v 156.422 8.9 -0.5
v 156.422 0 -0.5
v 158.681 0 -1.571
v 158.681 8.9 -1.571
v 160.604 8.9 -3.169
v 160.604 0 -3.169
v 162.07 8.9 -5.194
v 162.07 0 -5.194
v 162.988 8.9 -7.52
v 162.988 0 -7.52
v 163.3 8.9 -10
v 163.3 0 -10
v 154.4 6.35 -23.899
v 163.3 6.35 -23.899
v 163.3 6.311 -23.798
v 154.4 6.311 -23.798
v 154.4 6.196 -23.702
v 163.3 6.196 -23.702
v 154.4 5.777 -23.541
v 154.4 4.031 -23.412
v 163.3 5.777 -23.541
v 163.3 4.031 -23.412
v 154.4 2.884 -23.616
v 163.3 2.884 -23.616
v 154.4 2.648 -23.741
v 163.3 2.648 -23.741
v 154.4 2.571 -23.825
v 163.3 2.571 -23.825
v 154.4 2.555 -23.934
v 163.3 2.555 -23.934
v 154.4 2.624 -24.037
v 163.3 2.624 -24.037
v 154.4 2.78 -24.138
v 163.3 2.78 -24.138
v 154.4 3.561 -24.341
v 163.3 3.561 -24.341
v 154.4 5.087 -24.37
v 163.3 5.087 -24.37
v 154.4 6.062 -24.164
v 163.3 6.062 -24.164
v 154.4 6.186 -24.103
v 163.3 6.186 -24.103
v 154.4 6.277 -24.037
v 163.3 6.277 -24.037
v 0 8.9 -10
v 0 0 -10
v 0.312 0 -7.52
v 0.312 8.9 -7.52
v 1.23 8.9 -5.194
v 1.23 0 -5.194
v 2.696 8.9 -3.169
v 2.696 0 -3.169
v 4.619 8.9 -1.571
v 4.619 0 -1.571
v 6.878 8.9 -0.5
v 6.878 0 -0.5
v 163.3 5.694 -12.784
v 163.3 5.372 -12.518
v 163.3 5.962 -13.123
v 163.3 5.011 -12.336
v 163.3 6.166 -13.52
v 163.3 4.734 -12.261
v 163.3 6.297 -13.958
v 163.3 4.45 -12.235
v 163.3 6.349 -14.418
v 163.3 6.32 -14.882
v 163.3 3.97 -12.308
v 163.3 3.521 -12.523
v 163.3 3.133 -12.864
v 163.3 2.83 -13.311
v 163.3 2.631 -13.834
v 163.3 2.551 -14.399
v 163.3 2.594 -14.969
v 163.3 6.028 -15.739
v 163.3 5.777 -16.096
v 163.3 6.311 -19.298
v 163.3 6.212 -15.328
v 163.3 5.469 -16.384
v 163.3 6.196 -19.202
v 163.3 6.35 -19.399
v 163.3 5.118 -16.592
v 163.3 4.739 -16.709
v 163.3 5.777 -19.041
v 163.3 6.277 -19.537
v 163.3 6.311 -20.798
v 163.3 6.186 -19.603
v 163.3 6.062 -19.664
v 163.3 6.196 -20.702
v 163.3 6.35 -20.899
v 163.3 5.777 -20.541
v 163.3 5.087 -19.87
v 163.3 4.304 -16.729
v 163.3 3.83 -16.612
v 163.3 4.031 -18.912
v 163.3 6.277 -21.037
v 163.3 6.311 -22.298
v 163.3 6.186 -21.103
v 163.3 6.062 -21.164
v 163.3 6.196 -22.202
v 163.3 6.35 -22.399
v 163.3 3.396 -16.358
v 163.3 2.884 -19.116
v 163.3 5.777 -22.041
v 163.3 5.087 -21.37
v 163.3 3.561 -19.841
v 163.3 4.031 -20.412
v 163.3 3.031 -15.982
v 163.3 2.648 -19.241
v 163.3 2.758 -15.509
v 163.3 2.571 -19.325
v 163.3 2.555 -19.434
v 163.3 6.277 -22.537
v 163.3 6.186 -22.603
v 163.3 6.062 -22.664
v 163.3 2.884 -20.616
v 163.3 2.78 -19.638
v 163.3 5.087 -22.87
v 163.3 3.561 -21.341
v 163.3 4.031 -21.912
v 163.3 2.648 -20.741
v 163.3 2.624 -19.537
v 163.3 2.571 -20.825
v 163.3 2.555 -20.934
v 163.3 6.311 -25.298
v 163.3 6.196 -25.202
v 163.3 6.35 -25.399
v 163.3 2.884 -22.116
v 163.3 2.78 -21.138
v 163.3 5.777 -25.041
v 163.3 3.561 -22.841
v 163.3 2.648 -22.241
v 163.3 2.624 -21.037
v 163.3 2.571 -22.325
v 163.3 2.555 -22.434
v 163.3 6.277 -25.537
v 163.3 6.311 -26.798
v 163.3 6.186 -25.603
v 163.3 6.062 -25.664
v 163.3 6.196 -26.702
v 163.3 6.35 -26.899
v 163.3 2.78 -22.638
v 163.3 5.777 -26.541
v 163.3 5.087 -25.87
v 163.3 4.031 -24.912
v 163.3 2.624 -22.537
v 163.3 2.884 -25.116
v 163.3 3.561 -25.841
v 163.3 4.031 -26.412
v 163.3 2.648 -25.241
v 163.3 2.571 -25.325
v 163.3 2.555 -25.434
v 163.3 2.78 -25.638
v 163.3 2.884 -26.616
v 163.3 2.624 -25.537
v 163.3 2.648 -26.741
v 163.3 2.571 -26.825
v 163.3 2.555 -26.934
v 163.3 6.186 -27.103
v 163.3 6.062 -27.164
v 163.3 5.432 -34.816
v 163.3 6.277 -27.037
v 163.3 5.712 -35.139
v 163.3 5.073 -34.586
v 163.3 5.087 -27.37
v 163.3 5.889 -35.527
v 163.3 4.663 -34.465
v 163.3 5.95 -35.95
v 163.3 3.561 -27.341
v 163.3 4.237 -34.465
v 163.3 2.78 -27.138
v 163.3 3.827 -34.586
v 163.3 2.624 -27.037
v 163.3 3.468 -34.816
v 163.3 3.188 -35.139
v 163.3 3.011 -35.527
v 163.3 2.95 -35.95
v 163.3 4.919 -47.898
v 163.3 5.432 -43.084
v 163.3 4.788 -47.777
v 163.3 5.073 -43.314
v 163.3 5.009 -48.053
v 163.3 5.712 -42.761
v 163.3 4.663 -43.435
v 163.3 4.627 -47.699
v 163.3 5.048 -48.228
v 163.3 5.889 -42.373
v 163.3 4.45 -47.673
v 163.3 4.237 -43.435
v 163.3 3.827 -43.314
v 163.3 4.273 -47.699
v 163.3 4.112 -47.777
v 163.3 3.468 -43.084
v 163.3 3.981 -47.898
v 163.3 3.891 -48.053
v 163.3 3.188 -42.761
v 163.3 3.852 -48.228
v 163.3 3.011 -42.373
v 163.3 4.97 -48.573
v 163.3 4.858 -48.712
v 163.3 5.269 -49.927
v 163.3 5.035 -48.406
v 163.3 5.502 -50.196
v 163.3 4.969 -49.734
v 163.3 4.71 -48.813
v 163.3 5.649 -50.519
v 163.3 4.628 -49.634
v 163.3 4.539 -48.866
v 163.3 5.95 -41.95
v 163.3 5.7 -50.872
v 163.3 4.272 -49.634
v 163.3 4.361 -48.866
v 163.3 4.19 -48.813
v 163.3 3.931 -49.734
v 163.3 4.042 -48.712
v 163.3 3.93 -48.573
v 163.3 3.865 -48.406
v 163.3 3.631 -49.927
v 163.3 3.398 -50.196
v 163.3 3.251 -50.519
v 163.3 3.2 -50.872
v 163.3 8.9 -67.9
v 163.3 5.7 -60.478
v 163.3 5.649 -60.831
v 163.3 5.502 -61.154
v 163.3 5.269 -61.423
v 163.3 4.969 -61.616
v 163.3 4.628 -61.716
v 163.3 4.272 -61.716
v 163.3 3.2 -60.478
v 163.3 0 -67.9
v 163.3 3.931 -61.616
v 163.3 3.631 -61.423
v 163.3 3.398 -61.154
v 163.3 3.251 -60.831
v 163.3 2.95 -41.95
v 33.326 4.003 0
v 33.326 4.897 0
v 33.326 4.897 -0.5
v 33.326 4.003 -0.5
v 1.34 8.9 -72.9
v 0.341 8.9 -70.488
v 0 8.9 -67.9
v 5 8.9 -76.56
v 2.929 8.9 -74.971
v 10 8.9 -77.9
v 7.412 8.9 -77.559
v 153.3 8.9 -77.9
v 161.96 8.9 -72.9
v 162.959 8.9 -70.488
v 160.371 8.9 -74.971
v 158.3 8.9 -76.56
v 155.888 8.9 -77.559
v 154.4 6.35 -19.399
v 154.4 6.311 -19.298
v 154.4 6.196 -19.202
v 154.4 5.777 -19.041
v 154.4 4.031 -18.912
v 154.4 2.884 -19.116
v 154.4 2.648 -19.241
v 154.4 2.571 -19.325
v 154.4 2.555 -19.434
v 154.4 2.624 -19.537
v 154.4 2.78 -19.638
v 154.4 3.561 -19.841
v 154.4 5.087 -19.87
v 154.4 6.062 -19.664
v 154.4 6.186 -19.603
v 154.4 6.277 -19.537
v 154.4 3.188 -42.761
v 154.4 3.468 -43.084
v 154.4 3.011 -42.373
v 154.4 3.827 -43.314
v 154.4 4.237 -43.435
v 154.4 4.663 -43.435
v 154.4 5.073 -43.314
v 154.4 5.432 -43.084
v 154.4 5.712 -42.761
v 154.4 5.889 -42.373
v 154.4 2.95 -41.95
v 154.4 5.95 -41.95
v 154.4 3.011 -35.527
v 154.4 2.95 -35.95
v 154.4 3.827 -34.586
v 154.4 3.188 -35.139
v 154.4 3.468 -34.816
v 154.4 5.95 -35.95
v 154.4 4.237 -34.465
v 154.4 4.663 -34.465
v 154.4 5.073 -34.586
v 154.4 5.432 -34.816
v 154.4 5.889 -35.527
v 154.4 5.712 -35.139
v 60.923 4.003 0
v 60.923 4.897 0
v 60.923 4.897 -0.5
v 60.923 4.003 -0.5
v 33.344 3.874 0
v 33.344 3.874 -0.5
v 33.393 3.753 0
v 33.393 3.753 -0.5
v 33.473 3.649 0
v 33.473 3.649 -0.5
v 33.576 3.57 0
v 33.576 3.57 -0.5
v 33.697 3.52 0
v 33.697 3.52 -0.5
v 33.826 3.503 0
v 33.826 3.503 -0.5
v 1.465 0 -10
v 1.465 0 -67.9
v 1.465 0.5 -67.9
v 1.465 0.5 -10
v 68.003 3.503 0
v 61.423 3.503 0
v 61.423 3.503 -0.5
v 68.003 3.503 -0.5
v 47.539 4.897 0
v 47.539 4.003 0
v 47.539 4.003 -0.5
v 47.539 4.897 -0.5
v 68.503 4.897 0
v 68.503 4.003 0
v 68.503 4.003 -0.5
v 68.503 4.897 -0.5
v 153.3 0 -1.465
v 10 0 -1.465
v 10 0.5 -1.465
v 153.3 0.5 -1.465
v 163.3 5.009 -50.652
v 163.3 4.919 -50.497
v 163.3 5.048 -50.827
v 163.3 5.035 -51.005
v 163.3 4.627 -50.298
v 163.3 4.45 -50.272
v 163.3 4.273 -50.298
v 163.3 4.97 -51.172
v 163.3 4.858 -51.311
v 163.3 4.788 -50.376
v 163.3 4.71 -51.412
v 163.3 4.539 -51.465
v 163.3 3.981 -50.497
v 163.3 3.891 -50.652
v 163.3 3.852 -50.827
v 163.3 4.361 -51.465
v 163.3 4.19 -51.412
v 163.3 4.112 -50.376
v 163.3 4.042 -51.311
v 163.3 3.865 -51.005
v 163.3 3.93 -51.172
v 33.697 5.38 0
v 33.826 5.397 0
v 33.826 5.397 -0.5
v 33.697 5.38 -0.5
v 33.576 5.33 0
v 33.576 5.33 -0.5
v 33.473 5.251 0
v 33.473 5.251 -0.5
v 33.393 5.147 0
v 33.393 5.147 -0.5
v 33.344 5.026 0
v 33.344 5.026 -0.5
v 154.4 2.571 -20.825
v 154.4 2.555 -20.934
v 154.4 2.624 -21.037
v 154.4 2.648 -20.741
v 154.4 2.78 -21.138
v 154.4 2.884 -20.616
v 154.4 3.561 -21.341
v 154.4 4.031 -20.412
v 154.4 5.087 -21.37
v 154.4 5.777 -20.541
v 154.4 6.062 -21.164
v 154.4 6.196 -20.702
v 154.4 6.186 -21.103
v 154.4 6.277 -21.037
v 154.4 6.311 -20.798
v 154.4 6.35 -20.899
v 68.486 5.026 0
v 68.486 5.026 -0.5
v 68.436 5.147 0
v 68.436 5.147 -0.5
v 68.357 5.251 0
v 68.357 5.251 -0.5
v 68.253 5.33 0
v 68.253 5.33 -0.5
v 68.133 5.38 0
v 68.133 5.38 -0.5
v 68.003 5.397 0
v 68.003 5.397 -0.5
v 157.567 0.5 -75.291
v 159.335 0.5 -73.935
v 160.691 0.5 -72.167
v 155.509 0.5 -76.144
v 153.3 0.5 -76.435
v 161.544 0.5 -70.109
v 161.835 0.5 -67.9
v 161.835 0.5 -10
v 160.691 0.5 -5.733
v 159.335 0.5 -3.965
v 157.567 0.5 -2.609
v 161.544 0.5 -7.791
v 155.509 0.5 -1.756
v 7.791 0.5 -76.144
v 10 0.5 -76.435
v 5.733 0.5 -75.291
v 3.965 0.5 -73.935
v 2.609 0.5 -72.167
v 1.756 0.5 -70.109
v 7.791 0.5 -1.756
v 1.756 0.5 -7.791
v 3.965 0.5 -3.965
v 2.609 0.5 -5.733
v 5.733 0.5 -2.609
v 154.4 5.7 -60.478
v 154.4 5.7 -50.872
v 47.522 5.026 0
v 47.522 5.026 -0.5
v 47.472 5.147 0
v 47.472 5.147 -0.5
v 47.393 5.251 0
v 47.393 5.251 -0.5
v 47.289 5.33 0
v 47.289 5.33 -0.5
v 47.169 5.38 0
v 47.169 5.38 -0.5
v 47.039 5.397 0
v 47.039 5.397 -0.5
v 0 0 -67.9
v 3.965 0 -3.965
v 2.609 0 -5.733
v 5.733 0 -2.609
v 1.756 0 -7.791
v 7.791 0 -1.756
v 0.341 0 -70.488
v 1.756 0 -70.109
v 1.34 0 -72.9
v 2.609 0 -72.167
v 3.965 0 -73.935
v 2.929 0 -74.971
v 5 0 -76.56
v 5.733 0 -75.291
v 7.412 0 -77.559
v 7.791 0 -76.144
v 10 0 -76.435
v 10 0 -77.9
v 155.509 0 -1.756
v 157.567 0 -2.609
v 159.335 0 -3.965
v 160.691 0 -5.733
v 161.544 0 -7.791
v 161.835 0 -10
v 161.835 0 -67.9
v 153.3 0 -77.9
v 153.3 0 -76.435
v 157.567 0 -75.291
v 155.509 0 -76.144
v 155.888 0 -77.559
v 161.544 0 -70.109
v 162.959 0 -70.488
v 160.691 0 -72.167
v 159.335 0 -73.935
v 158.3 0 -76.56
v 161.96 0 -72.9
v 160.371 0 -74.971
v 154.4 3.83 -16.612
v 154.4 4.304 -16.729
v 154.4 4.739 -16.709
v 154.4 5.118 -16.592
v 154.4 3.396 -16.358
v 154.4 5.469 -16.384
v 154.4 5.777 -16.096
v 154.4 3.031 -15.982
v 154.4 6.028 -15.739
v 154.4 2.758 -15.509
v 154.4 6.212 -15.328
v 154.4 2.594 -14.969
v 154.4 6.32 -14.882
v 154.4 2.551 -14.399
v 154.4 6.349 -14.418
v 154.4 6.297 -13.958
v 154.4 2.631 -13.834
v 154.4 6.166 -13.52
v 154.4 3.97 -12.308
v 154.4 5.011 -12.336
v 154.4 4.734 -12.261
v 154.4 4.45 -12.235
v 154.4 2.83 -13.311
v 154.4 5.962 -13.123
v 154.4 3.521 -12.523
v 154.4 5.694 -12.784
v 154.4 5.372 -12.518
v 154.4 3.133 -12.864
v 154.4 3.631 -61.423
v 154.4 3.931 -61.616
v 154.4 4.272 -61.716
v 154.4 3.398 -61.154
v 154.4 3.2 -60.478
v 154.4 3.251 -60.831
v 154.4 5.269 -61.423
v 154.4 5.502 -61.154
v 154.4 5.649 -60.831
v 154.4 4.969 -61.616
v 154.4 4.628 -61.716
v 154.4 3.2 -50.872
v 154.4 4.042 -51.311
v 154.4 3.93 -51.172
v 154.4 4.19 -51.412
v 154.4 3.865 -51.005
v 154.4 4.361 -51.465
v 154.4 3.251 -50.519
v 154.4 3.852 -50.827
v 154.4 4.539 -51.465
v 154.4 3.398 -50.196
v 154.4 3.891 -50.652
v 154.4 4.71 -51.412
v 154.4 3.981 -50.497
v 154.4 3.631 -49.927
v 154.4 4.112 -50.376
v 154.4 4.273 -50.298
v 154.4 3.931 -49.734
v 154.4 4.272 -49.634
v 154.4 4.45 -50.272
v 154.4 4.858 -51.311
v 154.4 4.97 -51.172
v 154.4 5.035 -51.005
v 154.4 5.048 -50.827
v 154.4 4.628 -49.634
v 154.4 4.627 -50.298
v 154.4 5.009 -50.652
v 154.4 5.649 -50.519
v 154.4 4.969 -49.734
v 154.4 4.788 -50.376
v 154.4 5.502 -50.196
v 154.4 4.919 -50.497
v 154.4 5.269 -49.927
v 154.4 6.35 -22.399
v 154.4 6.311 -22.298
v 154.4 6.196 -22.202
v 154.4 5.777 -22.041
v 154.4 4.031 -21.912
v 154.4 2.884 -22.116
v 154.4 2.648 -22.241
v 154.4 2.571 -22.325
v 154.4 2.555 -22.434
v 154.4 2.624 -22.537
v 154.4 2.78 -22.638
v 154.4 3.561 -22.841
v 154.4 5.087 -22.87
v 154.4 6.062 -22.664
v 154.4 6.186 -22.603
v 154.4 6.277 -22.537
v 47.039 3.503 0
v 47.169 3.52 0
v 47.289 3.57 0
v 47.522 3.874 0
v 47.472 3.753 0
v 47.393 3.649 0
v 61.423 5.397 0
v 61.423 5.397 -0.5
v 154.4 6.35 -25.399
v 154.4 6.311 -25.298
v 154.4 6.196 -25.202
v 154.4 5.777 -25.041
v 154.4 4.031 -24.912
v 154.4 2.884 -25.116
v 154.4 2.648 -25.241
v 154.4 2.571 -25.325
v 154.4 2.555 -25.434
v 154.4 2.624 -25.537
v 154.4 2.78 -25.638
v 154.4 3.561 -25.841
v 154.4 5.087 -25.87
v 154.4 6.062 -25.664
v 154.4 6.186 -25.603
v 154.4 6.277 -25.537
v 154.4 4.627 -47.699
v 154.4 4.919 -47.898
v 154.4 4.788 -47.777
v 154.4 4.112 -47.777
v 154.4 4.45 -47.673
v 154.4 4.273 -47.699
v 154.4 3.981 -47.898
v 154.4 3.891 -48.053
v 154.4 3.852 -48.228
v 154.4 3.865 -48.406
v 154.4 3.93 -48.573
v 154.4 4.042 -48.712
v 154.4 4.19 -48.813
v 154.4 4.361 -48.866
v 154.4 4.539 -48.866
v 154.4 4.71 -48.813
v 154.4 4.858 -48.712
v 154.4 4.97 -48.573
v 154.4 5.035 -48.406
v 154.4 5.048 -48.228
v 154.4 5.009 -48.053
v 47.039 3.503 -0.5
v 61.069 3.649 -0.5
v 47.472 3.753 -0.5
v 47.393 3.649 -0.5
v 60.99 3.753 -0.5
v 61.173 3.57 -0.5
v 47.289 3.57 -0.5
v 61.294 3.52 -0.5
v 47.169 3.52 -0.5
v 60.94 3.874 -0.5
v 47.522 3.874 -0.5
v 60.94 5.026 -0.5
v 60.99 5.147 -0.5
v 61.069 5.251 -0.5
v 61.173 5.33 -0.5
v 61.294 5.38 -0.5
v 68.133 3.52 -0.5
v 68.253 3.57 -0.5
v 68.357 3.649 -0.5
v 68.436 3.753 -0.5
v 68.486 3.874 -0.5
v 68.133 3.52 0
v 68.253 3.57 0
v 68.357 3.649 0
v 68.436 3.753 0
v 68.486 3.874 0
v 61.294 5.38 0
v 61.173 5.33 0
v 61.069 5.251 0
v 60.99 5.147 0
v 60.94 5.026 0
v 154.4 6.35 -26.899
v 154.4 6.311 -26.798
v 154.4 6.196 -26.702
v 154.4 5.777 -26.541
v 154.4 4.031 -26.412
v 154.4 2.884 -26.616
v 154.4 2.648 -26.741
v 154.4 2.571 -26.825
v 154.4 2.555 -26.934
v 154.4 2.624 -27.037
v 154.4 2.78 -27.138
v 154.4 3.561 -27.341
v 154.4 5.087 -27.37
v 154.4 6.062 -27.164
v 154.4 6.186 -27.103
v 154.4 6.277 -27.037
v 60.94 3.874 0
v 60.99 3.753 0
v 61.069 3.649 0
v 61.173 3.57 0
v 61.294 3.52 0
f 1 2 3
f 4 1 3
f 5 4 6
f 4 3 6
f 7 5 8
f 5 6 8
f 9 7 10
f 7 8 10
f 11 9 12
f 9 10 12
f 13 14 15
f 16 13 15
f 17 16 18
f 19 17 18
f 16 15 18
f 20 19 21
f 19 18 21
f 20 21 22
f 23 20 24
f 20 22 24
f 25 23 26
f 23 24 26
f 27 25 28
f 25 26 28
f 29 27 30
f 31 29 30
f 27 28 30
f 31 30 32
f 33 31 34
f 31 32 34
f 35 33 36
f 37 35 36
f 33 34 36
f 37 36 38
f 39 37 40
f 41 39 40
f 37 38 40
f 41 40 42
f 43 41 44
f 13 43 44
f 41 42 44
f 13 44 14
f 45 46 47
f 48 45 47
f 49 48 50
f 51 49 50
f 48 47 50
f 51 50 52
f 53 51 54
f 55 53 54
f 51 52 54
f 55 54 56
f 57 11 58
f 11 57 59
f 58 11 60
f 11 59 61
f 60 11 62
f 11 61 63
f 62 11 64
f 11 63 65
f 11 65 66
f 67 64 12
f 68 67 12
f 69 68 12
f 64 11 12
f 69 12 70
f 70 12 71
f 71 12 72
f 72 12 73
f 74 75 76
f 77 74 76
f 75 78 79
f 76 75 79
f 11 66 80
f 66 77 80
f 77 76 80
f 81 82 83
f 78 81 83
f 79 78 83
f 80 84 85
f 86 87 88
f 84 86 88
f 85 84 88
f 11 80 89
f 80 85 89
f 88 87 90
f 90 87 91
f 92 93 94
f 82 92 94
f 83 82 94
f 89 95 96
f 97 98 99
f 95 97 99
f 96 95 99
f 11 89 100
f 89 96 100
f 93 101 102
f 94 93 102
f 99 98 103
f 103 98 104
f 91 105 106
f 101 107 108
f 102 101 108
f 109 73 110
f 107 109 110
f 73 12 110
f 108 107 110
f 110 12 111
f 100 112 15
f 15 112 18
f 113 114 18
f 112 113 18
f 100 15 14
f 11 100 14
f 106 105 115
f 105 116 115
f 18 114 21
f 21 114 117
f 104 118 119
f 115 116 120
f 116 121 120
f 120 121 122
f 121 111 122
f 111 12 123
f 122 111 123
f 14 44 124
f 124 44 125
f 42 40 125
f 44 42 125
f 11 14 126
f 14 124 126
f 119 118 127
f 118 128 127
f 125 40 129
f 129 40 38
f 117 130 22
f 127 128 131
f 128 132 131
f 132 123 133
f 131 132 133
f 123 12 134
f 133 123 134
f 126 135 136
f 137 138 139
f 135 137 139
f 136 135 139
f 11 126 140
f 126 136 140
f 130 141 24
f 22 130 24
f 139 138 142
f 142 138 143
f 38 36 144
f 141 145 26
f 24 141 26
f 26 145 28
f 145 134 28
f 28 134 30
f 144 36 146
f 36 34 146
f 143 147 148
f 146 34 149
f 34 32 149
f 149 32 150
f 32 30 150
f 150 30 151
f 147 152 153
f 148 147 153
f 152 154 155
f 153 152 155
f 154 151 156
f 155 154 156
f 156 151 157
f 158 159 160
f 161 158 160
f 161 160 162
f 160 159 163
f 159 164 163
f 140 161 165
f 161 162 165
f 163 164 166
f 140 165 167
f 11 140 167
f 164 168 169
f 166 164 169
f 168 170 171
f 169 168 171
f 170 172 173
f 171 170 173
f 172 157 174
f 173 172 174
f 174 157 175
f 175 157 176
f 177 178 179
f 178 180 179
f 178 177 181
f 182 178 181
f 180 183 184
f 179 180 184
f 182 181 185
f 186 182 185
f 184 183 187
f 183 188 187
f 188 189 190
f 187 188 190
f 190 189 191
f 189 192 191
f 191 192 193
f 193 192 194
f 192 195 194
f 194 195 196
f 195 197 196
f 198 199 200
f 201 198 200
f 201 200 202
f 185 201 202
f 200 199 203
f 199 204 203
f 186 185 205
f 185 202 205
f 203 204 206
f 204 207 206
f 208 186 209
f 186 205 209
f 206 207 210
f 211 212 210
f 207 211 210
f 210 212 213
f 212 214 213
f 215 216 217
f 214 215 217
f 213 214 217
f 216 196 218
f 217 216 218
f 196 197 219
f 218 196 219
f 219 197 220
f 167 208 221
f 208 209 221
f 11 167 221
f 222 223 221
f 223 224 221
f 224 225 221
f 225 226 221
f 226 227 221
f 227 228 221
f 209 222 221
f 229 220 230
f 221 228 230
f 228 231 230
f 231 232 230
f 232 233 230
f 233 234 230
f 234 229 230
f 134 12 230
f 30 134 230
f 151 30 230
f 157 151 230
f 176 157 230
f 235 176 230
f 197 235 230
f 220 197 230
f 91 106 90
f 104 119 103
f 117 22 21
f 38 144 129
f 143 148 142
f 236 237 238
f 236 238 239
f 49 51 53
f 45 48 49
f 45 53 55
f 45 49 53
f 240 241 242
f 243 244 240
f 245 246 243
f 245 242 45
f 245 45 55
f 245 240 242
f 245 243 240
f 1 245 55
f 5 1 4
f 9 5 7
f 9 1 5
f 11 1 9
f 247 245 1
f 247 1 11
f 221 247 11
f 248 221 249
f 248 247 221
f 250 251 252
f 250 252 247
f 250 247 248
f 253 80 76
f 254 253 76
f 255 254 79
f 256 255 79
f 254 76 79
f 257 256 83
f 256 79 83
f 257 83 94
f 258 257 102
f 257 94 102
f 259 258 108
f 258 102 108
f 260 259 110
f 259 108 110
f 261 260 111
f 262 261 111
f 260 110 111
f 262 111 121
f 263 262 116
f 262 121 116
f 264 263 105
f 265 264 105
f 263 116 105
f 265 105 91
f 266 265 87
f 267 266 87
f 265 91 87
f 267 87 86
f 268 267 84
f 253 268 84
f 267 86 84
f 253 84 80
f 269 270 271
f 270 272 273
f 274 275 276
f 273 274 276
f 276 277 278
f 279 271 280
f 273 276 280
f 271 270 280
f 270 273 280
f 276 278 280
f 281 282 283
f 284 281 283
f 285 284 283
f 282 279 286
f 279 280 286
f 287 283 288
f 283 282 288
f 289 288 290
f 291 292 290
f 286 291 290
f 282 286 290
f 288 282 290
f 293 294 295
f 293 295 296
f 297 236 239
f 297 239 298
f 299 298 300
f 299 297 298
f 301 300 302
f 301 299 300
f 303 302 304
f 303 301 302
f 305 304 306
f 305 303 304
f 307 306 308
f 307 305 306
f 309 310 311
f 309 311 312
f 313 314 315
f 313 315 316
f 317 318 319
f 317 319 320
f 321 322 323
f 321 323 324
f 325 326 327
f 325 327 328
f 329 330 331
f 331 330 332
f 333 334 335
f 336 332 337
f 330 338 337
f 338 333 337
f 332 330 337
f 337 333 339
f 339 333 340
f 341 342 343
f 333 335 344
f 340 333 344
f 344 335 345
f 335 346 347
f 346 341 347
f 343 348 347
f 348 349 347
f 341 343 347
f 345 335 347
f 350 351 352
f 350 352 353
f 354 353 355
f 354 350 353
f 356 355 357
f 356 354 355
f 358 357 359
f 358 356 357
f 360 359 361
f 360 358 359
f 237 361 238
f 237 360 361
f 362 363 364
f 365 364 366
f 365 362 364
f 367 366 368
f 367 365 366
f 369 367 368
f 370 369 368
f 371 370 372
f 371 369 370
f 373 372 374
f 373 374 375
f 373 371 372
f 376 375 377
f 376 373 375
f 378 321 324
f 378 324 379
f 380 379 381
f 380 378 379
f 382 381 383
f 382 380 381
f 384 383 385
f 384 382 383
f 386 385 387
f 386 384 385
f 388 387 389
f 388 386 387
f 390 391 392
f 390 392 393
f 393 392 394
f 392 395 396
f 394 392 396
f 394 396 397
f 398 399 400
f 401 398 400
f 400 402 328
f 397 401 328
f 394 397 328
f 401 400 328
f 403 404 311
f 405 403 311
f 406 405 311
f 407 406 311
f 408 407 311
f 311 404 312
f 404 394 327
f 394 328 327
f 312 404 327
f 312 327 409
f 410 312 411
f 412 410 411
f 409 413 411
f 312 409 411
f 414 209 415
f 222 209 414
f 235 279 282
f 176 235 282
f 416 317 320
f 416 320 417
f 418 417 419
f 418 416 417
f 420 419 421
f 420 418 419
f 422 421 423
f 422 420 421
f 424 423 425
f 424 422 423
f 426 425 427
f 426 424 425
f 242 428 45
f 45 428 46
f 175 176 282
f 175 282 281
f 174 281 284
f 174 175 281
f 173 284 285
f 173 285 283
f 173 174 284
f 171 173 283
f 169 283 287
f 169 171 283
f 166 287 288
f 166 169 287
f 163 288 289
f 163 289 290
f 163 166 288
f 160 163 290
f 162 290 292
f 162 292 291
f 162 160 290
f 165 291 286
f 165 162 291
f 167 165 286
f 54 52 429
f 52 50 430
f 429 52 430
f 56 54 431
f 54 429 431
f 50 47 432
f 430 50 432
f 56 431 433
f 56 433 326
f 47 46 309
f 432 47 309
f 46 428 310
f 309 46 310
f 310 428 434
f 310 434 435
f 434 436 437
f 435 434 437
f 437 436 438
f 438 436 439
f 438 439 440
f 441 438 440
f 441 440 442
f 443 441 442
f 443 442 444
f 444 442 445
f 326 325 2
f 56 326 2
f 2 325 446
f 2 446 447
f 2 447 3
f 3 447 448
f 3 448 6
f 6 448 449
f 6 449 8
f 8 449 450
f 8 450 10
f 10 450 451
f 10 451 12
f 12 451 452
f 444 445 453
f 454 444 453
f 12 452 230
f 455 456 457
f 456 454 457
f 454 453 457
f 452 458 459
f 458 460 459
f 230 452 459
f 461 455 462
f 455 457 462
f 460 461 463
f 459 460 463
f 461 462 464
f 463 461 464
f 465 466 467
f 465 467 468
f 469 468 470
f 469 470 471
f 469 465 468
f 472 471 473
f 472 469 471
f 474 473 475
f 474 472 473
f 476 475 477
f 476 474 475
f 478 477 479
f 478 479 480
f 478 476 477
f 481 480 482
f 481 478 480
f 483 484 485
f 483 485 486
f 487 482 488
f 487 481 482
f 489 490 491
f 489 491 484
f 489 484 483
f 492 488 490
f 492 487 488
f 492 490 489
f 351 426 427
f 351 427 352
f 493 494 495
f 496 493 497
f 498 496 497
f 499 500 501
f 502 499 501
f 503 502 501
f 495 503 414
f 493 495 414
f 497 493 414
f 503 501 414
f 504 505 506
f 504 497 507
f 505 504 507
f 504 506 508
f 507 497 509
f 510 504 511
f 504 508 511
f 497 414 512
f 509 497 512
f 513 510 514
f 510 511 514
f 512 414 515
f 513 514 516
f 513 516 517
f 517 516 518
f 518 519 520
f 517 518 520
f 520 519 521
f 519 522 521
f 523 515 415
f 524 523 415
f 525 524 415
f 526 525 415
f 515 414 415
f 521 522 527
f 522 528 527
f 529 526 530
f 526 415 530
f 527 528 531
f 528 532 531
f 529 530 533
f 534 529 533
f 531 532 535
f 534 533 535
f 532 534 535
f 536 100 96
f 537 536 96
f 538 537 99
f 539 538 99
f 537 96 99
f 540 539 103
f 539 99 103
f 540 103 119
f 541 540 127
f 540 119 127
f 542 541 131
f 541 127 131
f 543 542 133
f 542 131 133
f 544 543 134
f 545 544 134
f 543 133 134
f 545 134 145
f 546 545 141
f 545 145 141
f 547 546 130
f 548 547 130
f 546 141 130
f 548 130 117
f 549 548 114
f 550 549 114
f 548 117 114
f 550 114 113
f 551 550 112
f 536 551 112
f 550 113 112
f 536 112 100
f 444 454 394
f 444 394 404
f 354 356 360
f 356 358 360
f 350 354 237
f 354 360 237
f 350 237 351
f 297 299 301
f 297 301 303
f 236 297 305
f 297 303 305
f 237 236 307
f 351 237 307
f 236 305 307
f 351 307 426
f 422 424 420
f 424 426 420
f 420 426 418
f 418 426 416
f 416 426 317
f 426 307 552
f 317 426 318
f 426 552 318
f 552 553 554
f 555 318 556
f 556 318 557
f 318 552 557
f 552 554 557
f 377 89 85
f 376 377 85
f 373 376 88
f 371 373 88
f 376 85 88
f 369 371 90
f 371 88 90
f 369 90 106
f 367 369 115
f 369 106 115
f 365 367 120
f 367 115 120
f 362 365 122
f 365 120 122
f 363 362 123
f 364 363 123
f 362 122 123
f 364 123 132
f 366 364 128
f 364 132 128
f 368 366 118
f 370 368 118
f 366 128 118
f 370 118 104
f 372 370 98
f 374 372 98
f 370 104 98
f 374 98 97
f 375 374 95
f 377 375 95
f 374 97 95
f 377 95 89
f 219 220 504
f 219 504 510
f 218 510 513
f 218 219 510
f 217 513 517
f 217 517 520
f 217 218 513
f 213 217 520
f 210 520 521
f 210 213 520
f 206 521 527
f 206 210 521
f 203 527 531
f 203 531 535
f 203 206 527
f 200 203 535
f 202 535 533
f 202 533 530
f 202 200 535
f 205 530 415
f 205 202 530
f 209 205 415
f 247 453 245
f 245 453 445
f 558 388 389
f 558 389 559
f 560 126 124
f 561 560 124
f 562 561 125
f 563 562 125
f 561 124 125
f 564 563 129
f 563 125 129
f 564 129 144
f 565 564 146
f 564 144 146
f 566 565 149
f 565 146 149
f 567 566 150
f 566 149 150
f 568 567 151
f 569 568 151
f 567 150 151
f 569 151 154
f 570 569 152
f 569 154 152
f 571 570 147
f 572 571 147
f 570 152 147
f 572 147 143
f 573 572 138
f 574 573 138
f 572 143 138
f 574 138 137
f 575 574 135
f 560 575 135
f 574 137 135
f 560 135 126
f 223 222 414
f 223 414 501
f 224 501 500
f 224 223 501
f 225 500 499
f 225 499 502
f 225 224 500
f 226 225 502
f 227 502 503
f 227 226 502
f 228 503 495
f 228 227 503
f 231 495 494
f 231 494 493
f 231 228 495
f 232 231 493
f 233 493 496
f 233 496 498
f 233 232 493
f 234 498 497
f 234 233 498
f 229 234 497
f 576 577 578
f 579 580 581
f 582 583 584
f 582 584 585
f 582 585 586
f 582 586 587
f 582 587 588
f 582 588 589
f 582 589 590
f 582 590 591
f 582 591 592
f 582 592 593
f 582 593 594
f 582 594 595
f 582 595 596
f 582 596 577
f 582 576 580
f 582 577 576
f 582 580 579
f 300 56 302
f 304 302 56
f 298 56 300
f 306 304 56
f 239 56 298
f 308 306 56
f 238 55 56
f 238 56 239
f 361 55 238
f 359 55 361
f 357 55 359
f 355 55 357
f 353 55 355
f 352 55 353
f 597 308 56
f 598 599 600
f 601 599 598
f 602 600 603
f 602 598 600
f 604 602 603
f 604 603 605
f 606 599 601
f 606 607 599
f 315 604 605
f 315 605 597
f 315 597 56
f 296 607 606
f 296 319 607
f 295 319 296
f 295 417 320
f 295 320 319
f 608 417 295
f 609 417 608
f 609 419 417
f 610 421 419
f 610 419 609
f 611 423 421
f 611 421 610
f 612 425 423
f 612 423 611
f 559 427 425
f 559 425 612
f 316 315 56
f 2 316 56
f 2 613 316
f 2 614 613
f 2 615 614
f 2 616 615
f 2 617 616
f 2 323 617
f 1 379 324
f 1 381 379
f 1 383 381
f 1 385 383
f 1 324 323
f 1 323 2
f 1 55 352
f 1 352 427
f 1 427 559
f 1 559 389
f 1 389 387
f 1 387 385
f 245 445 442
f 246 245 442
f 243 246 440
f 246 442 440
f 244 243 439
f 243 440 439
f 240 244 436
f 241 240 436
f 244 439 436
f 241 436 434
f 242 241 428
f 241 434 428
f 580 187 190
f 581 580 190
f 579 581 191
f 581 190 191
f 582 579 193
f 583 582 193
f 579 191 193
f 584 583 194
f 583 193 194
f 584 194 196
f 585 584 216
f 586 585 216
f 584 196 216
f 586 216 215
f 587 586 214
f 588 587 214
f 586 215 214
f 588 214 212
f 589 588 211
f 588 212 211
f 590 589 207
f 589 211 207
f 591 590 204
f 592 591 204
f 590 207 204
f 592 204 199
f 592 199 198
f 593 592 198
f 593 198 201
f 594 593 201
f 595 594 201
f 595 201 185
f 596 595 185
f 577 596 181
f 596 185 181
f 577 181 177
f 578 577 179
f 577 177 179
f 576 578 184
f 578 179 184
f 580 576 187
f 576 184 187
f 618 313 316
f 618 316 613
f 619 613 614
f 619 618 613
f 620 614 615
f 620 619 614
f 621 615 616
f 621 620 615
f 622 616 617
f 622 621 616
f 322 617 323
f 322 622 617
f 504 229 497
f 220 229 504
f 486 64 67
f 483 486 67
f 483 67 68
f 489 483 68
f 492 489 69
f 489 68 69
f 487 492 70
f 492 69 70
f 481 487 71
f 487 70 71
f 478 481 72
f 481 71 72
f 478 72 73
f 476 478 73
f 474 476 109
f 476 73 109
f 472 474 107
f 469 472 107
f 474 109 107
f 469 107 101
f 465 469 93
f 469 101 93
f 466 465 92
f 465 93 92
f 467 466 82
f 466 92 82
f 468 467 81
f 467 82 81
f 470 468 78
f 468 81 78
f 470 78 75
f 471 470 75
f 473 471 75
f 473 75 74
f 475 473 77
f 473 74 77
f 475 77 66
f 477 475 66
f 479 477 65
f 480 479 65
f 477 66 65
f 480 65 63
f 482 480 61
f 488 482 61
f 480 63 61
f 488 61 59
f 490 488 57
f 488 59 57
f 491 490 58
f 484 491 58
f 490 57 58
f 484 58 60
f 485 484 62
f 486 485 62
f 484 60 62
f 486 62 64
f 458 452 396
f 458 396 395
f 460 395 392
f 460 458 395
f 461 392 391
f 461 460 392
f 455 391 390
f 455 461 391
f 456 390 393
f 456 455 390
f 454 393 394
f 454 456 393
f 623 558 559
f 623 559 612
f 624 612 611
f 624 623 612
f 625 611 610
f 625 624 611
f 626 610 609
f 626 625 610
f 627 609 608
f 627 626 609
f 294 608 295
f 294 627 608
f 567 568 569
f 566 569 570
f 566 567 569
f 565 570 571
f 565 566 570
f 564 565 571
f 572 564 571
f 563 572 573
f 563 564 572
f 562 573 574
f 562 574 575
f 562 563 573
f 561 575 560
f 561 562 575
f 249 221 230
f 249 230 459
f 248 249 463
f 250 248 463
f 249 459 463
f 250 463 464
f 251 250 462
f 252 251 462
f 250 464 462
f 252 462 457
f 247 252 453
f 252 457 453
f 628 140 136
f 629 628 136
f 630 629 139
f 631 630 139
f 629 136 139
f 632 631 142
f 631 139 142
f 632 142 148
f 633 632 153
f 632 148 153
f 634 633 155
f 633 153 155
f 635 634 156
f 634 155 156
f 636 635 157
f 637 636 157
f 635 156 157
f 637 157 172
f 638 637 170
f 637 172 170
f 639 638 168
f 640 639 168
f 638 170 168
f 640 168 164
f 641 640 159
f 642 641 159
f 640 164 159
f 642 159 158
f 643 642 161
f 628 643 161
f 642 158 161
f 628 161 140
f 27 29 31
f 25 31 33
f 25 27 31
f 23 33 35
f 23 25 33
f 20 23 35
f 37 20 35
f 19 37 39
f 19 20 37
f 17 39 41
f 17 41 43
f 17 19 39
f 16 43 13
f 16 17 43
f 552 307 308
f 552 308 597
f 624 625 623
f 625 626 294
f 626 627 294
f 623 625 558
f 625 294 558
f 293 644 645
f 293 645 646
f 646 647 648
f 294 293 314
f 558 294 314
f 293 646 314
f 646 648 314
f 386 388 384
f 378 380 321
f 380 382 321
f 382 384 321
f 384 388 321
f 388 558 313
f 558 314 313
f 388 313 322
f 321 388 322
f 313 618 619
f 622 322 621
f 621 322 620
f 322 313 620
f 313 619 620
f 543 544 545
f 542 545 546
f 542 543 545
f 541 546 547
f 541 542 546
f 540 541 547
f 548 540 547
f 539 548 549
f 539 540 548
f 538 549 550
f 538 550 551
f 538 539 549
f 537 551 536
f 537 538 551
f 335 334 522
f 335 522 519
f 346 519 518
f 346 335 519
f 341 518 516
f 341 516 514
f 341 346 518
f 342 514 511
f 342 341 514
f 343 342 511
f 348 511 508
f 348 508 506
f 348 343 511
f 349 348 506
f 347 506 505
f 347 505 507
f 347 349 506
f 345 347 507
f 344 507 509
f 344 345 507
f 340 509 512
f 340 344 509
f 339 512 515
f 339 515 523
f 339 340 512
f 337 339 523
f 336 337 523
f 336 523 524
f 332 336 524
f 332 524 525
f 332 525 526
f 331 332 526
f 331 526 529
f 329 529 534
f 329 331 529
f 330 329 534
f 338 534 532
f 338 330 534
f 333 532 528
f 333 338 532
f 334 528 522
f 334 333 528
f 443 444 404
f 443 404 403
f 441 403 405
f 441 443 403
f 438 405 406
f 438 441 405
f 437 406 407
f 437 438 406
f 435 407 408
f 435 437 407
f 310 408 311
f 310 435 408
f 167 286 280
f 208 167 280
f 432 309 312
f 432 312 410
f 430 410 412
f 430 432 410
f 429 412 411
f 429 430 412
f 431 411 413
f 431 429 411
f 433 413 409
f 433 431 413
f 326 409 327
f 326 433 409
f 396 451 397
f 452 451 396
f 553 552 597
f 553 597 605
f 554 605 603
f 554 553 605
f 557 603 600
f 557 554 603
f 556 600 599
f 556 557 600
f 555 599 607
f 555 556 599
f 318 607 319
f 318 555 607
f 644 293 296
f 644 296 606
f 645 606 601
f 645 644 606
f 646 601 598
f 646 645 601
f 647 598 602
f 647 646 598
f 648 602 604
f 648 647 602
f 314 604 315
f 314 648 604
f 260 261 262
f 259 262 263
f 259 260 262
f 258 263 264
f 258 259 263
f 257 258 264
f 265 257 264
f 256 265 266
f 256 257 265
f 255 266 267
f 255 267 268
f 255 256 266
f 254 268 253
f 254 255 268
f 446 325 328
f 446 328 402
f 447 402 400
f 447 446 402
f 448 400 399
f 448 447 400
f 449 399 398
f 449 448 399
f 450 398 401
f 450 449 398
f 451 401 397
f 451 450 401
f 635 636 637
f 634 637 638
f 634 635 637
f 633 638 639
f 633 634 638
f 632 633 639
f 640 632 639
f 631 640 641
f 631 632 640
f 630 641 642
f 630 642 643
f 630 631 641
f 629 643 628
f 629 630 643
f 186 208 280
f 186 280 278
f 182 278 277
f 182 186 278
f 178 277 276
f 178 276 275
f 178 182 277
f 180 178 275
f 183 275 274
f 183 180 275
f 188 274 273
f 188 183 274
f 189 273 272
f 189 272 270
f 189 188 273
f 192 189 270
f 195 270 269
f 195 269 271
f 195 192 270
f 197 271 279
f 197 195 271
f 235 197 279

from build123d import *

# Parameters (mm, degrees)
EXTRUDE_1_DEPTH     = 8.9
CUT_EXTRUDE_START   = 163.3
SKETCH_2_R          = 0.6
SKETCH_2_RX         = 2.25
SKETCH_2_RY         = 1.9
SKETCH_2_RX_2       = 1.9
SKETCH_2_RY_2       = 0.5
CUT_EXTRUDE_5_DEPTH = 8.9
SKETCH_7_OUTSIDE_W  = 201.53
SKETCH_7_OUTSIDE_H  = 47.13
CUT_EXTRUDE_6_DEPTH = 0.5
CUT_EXTRUDE_7_DEPTH = 0.5


with BuildPart() as part:
    # 草图1 → 凸台-拉伸1 (new body)
    with BuildSketch(Plane(origin=(0, 0, 0), x_dir=(1, 0, 0), z_dir=(0, 1, 0))):
        with BuildLine():
            Line((10, 0), (153.3, 0))
            ThreePointArc((153.3, 0), (160.371067812, 2.928932188), (163.3, 10))
            Line((163.3, 10), (163.3, 67.9))
            ThreePointArc((163.3, 67.9), (160.371067812, 74.971067812), (153.3, 77.9))
            Line((153.3, 77.9), (10, 77.9))
            ThreePointArc((10, 77.9), (2.928932188, 74.971067812), (0, 67.9))
            Line((0, 67.9), (0, 10))
            ThreePointArc((0, 10), (2.928932188, 2.928932188), (10, 0))
        make_face()
    extrude(amount=EXTRUDE_1_DEPTH)

    # 草图2 → 切除-拉伸5 (cut)
    # profile 1 of 10: a face of its own
    with BuildSketch(Plane(origin=(0, 0, 0), x_dir=(0, 0, -1), z_dir=(1, 0, 0)).offset(CUT_EXTRUDE_START)):
        with Locations(Location((48.272527564, 4.45, 0), (0, 0, 180))):
            Circle(SKETCH_2_R)
    # profile 2 of 10: a face of its own
    with BuildSketch(Plane(origin=(0, 0, 0), x_dir=(0, 0, -1), z_dir=(1, 0, 0)).offset(CUT_EXTRUDE_START)):
        with Locations(Location((14.485427664, 4.45), (0, 0, 180))):
            Ellipse(SKETCH_2_RX, SKETCH_2_RY)
    # profile 3 of 10: a face of its own
    with BuildSketch(Plane(origin=(0, 0, 0), x_dir=(0, 0, -1), z_dir=(1, 0, 0)).offset(CUT_EXTRUDE_START)):
        with Locations(Location((19.399284115, 4.45), (0, 0, 90))):
            Ellipse(SKETCH_2_RX_2, SKETCH_2_RY_2)
    # profile 4 of 10: a face of its own
    with BuildSketch(Plane(origin=(0, 0, 0), x_dir=(0, 0, -1), z_dir=(1, 0, 0)).offset(CUT_EXTRUDE_START)):
        with Locations(Location((20.899284115, 4.45), (0, 0, 90))):
            Ellipse(SKETCH_2_RX_2, SKETCH_2_RY_2)
    # profile 5 of 10: a face of its own
    with BuildSketch(Plane(origin=(0, 0, 0), x_dir=(0, 0, -1), z_dir=(1, 0, 0)).offset(CUT_EXTRUDE_START)):
        with Locations(Location((22.399284115, 4.45), (0, 0, 90))):
            Ellipse(SKETCH_2_RX_2, SKETCH_2_RY_2)
    # profile 6 of 10: a face of its own
    with BuildSketch(Plane(origin=(0, 0, 0), x_dir=(0, 0, -1), z_dir=(1, 0, 0)).offset(CUT_EXTRUDE_START)):
        with Locations(Location((23.899284115, 4.45), (0, 0, 90))):
            Ellipse(SKETCH_2_RX_2, SKETCH_2_RY_2)
    # profile 7 of 10: a face of its own
    with BuildSketch(Plane(origin=(0, 0, 0), x_dir=(0, 0, -1), z_dir=(1, 0, 0)).offset(CUT_EXTRUDE_START)):
        with Locations(Location((25.399284115, 4.45), (0, 0, 90))):
            Ellipse(SKETCH_2_RX_2, SKETCH_2_RY_2)
    # profile 8 of 10: a face of its own
    with BuildSketch(Plane(origin=(0, 0, 0), x_dir=(0, 0, -1), z_dir=(1, 0, 0)).offset(CUT_EXTRUDE_START)):
        with Locations(Location((26.899284115, 4.45), (0, 0, 90))):
            Ellipse(SKETCH_2_RX_2, SKETCH_2_RY_2)
    # profile 9 of 10: a face of its own
    with BuildSketch(Plane(origin=(0, 0, 0), x_dir=(0, 0, -1), z_dir=(1, 0, 0)).offset(CUT_EXTRUDE_START)):
        with BuildLine():
            Line((41.95, 2.95), (35.95, 2.95))
            ThreePointArc((35.95, 2.95), (34.45, 4.45), (35.95, 5.95))
            Line((35.95, 5.95), (41.95, 5.95))
            ThreePointArc((41.95, 5.95), (43.45, 4.45), (41.95, 2.95))
        make_face()
    # profile 10 of 10: a face of its own
    with BuildSketch(Plane(origin=(0, 0, 0), x_dir=(0, 0, -1), z_dir=(1, 0, 0)).offset(CUT_EXTRUDE_START)):
        with BuildLine():
            Line((60.478464751, 3.2), (50.871535249, 3.2))
            ThreePointArc((50.871535249, 3.2), (49.621535249, 4.45), (50.871535249, 5.7))
            Line((50.871535249, 5.7), (60.478464751, 5.7))
            ThreePointArc((60.478464751, 5.7), (61.728464751, 4.45), (60.478464751, 3.2))
        make_face()
        with Locations(Location((50.871535249, 4.45, 0), (0, 0, 180))):
            Circle(SKETCH_2_R, mode=Mode.SUBTRACT)
    extrude(amount=-CUT_EXTRUDE_5_DEPTH, mode=Mode.SUBTRACT)

    # 草图7 outside → 切除-拉伸6 (cut)
    with BuildSketch(Plane.XY):
        with Locations((81.65, 4.45)):
            Rectangle(SKETCH_7_OUTSIDE_W, SKETCH_7_OUTSIDE_H)
        with BuildLine():
            Line((33.826473294, 3.502985919), (47.039275266, 3.502985919))
            ThreePointArc((47.039275266, 3.502985919), (47.392828657, 3.649432529), (47.539275266, 4.002985919))
            Line((47.539275266, 4.002985919), (47.539275266, 4.897014081))
            ThreePointArc((47.539275266, 4.897014081), (47.392828657, 5.250567471), (47.039275266, 5.397014081))
            Line((47.039275266, 5.397014081), (33.826473294, 5.397014081))
            ThreePointArc((33.826473294, 5.397014081), (33.472919903, 5.250567471), (33.326473294, 4.897014081))
            Line((33.326473294, 4.897014081), (33.326473294, 4.002985919))
            ThreePointArc((33.326473294, 4.002985919), (33.472919903, 3.649432529), (33.826473294, 3.502985919))
        make_face(mode=Mode.SUBTRACT)
        with BuildLine():
            Line((61.422997124, 3.502985919), (68.003158176, 3.502985919))
            ThreePointArc((68.003158176, 3.502985919), (68.356711566, 3.649432529), (68.503158176, 4.002985919))
            Line((68.503158176, 4.002985919), (68.503158176, 4.897014081))
            ThreePointArc((68.503158176, 4.897014081), (68.356711566, 5.250567471), (68.003158176, 5.397014081))
            Line((68.003158176, 5.397014081), (61.422997124, 5.397014081))
            ThreePointArc((61.422997124, 5.397014081), (61.069443733, 5.250567471), (60.922997124, 4.897014081))
            Line((60.922997124, 4.897014081), (60.922997124, 4.002985919))
            ThreePointArc((60.922997124, 4.002985919), (61.069443733, 3.649432529), (61.422997124, 3.502985919))
        make_face(mode=Mode.SUBTRACT)
    extrude(amount=-CUT_EXTRUDE_6_DEPTH, mode=Mode.SUBTRACT)

    # 草图8 → 切除-拉伸7 (cut)
    with BuildSketch(Plane.XZ):
        with BuildLine():
            Line((1.465261874, -67.9), (1.465261874, -10))
            ThreePointArc((1.465261874, -10), (3.965028796, -3.965028796), (10, -1.465261874))
            Line((10, -1.465261874), (153.3, -1.465261874))
            ThreePointArc((153.3, -1.465261874), (159.334971204, -3.965028796), (161.834738126, -10))
            Line((161.834738126, -10), (161.834738126, -67.9))
            ThreePointArc((161.834738126, -67.9), (159.334971204, -73.934971204), (153.3, -76.434738126))
            Line((153.3, -76.434738126), (10, -76.434738126))
            ThreePointArc((10, -76.434738126), (3.965028796, -73.934971204), (1.465261874, -67.9))
        make_face()
    extrude(amount=-CUT_EXTRUDE_7_DEPTH, mode=Mode.SUBTRACT)


solid = part.part
